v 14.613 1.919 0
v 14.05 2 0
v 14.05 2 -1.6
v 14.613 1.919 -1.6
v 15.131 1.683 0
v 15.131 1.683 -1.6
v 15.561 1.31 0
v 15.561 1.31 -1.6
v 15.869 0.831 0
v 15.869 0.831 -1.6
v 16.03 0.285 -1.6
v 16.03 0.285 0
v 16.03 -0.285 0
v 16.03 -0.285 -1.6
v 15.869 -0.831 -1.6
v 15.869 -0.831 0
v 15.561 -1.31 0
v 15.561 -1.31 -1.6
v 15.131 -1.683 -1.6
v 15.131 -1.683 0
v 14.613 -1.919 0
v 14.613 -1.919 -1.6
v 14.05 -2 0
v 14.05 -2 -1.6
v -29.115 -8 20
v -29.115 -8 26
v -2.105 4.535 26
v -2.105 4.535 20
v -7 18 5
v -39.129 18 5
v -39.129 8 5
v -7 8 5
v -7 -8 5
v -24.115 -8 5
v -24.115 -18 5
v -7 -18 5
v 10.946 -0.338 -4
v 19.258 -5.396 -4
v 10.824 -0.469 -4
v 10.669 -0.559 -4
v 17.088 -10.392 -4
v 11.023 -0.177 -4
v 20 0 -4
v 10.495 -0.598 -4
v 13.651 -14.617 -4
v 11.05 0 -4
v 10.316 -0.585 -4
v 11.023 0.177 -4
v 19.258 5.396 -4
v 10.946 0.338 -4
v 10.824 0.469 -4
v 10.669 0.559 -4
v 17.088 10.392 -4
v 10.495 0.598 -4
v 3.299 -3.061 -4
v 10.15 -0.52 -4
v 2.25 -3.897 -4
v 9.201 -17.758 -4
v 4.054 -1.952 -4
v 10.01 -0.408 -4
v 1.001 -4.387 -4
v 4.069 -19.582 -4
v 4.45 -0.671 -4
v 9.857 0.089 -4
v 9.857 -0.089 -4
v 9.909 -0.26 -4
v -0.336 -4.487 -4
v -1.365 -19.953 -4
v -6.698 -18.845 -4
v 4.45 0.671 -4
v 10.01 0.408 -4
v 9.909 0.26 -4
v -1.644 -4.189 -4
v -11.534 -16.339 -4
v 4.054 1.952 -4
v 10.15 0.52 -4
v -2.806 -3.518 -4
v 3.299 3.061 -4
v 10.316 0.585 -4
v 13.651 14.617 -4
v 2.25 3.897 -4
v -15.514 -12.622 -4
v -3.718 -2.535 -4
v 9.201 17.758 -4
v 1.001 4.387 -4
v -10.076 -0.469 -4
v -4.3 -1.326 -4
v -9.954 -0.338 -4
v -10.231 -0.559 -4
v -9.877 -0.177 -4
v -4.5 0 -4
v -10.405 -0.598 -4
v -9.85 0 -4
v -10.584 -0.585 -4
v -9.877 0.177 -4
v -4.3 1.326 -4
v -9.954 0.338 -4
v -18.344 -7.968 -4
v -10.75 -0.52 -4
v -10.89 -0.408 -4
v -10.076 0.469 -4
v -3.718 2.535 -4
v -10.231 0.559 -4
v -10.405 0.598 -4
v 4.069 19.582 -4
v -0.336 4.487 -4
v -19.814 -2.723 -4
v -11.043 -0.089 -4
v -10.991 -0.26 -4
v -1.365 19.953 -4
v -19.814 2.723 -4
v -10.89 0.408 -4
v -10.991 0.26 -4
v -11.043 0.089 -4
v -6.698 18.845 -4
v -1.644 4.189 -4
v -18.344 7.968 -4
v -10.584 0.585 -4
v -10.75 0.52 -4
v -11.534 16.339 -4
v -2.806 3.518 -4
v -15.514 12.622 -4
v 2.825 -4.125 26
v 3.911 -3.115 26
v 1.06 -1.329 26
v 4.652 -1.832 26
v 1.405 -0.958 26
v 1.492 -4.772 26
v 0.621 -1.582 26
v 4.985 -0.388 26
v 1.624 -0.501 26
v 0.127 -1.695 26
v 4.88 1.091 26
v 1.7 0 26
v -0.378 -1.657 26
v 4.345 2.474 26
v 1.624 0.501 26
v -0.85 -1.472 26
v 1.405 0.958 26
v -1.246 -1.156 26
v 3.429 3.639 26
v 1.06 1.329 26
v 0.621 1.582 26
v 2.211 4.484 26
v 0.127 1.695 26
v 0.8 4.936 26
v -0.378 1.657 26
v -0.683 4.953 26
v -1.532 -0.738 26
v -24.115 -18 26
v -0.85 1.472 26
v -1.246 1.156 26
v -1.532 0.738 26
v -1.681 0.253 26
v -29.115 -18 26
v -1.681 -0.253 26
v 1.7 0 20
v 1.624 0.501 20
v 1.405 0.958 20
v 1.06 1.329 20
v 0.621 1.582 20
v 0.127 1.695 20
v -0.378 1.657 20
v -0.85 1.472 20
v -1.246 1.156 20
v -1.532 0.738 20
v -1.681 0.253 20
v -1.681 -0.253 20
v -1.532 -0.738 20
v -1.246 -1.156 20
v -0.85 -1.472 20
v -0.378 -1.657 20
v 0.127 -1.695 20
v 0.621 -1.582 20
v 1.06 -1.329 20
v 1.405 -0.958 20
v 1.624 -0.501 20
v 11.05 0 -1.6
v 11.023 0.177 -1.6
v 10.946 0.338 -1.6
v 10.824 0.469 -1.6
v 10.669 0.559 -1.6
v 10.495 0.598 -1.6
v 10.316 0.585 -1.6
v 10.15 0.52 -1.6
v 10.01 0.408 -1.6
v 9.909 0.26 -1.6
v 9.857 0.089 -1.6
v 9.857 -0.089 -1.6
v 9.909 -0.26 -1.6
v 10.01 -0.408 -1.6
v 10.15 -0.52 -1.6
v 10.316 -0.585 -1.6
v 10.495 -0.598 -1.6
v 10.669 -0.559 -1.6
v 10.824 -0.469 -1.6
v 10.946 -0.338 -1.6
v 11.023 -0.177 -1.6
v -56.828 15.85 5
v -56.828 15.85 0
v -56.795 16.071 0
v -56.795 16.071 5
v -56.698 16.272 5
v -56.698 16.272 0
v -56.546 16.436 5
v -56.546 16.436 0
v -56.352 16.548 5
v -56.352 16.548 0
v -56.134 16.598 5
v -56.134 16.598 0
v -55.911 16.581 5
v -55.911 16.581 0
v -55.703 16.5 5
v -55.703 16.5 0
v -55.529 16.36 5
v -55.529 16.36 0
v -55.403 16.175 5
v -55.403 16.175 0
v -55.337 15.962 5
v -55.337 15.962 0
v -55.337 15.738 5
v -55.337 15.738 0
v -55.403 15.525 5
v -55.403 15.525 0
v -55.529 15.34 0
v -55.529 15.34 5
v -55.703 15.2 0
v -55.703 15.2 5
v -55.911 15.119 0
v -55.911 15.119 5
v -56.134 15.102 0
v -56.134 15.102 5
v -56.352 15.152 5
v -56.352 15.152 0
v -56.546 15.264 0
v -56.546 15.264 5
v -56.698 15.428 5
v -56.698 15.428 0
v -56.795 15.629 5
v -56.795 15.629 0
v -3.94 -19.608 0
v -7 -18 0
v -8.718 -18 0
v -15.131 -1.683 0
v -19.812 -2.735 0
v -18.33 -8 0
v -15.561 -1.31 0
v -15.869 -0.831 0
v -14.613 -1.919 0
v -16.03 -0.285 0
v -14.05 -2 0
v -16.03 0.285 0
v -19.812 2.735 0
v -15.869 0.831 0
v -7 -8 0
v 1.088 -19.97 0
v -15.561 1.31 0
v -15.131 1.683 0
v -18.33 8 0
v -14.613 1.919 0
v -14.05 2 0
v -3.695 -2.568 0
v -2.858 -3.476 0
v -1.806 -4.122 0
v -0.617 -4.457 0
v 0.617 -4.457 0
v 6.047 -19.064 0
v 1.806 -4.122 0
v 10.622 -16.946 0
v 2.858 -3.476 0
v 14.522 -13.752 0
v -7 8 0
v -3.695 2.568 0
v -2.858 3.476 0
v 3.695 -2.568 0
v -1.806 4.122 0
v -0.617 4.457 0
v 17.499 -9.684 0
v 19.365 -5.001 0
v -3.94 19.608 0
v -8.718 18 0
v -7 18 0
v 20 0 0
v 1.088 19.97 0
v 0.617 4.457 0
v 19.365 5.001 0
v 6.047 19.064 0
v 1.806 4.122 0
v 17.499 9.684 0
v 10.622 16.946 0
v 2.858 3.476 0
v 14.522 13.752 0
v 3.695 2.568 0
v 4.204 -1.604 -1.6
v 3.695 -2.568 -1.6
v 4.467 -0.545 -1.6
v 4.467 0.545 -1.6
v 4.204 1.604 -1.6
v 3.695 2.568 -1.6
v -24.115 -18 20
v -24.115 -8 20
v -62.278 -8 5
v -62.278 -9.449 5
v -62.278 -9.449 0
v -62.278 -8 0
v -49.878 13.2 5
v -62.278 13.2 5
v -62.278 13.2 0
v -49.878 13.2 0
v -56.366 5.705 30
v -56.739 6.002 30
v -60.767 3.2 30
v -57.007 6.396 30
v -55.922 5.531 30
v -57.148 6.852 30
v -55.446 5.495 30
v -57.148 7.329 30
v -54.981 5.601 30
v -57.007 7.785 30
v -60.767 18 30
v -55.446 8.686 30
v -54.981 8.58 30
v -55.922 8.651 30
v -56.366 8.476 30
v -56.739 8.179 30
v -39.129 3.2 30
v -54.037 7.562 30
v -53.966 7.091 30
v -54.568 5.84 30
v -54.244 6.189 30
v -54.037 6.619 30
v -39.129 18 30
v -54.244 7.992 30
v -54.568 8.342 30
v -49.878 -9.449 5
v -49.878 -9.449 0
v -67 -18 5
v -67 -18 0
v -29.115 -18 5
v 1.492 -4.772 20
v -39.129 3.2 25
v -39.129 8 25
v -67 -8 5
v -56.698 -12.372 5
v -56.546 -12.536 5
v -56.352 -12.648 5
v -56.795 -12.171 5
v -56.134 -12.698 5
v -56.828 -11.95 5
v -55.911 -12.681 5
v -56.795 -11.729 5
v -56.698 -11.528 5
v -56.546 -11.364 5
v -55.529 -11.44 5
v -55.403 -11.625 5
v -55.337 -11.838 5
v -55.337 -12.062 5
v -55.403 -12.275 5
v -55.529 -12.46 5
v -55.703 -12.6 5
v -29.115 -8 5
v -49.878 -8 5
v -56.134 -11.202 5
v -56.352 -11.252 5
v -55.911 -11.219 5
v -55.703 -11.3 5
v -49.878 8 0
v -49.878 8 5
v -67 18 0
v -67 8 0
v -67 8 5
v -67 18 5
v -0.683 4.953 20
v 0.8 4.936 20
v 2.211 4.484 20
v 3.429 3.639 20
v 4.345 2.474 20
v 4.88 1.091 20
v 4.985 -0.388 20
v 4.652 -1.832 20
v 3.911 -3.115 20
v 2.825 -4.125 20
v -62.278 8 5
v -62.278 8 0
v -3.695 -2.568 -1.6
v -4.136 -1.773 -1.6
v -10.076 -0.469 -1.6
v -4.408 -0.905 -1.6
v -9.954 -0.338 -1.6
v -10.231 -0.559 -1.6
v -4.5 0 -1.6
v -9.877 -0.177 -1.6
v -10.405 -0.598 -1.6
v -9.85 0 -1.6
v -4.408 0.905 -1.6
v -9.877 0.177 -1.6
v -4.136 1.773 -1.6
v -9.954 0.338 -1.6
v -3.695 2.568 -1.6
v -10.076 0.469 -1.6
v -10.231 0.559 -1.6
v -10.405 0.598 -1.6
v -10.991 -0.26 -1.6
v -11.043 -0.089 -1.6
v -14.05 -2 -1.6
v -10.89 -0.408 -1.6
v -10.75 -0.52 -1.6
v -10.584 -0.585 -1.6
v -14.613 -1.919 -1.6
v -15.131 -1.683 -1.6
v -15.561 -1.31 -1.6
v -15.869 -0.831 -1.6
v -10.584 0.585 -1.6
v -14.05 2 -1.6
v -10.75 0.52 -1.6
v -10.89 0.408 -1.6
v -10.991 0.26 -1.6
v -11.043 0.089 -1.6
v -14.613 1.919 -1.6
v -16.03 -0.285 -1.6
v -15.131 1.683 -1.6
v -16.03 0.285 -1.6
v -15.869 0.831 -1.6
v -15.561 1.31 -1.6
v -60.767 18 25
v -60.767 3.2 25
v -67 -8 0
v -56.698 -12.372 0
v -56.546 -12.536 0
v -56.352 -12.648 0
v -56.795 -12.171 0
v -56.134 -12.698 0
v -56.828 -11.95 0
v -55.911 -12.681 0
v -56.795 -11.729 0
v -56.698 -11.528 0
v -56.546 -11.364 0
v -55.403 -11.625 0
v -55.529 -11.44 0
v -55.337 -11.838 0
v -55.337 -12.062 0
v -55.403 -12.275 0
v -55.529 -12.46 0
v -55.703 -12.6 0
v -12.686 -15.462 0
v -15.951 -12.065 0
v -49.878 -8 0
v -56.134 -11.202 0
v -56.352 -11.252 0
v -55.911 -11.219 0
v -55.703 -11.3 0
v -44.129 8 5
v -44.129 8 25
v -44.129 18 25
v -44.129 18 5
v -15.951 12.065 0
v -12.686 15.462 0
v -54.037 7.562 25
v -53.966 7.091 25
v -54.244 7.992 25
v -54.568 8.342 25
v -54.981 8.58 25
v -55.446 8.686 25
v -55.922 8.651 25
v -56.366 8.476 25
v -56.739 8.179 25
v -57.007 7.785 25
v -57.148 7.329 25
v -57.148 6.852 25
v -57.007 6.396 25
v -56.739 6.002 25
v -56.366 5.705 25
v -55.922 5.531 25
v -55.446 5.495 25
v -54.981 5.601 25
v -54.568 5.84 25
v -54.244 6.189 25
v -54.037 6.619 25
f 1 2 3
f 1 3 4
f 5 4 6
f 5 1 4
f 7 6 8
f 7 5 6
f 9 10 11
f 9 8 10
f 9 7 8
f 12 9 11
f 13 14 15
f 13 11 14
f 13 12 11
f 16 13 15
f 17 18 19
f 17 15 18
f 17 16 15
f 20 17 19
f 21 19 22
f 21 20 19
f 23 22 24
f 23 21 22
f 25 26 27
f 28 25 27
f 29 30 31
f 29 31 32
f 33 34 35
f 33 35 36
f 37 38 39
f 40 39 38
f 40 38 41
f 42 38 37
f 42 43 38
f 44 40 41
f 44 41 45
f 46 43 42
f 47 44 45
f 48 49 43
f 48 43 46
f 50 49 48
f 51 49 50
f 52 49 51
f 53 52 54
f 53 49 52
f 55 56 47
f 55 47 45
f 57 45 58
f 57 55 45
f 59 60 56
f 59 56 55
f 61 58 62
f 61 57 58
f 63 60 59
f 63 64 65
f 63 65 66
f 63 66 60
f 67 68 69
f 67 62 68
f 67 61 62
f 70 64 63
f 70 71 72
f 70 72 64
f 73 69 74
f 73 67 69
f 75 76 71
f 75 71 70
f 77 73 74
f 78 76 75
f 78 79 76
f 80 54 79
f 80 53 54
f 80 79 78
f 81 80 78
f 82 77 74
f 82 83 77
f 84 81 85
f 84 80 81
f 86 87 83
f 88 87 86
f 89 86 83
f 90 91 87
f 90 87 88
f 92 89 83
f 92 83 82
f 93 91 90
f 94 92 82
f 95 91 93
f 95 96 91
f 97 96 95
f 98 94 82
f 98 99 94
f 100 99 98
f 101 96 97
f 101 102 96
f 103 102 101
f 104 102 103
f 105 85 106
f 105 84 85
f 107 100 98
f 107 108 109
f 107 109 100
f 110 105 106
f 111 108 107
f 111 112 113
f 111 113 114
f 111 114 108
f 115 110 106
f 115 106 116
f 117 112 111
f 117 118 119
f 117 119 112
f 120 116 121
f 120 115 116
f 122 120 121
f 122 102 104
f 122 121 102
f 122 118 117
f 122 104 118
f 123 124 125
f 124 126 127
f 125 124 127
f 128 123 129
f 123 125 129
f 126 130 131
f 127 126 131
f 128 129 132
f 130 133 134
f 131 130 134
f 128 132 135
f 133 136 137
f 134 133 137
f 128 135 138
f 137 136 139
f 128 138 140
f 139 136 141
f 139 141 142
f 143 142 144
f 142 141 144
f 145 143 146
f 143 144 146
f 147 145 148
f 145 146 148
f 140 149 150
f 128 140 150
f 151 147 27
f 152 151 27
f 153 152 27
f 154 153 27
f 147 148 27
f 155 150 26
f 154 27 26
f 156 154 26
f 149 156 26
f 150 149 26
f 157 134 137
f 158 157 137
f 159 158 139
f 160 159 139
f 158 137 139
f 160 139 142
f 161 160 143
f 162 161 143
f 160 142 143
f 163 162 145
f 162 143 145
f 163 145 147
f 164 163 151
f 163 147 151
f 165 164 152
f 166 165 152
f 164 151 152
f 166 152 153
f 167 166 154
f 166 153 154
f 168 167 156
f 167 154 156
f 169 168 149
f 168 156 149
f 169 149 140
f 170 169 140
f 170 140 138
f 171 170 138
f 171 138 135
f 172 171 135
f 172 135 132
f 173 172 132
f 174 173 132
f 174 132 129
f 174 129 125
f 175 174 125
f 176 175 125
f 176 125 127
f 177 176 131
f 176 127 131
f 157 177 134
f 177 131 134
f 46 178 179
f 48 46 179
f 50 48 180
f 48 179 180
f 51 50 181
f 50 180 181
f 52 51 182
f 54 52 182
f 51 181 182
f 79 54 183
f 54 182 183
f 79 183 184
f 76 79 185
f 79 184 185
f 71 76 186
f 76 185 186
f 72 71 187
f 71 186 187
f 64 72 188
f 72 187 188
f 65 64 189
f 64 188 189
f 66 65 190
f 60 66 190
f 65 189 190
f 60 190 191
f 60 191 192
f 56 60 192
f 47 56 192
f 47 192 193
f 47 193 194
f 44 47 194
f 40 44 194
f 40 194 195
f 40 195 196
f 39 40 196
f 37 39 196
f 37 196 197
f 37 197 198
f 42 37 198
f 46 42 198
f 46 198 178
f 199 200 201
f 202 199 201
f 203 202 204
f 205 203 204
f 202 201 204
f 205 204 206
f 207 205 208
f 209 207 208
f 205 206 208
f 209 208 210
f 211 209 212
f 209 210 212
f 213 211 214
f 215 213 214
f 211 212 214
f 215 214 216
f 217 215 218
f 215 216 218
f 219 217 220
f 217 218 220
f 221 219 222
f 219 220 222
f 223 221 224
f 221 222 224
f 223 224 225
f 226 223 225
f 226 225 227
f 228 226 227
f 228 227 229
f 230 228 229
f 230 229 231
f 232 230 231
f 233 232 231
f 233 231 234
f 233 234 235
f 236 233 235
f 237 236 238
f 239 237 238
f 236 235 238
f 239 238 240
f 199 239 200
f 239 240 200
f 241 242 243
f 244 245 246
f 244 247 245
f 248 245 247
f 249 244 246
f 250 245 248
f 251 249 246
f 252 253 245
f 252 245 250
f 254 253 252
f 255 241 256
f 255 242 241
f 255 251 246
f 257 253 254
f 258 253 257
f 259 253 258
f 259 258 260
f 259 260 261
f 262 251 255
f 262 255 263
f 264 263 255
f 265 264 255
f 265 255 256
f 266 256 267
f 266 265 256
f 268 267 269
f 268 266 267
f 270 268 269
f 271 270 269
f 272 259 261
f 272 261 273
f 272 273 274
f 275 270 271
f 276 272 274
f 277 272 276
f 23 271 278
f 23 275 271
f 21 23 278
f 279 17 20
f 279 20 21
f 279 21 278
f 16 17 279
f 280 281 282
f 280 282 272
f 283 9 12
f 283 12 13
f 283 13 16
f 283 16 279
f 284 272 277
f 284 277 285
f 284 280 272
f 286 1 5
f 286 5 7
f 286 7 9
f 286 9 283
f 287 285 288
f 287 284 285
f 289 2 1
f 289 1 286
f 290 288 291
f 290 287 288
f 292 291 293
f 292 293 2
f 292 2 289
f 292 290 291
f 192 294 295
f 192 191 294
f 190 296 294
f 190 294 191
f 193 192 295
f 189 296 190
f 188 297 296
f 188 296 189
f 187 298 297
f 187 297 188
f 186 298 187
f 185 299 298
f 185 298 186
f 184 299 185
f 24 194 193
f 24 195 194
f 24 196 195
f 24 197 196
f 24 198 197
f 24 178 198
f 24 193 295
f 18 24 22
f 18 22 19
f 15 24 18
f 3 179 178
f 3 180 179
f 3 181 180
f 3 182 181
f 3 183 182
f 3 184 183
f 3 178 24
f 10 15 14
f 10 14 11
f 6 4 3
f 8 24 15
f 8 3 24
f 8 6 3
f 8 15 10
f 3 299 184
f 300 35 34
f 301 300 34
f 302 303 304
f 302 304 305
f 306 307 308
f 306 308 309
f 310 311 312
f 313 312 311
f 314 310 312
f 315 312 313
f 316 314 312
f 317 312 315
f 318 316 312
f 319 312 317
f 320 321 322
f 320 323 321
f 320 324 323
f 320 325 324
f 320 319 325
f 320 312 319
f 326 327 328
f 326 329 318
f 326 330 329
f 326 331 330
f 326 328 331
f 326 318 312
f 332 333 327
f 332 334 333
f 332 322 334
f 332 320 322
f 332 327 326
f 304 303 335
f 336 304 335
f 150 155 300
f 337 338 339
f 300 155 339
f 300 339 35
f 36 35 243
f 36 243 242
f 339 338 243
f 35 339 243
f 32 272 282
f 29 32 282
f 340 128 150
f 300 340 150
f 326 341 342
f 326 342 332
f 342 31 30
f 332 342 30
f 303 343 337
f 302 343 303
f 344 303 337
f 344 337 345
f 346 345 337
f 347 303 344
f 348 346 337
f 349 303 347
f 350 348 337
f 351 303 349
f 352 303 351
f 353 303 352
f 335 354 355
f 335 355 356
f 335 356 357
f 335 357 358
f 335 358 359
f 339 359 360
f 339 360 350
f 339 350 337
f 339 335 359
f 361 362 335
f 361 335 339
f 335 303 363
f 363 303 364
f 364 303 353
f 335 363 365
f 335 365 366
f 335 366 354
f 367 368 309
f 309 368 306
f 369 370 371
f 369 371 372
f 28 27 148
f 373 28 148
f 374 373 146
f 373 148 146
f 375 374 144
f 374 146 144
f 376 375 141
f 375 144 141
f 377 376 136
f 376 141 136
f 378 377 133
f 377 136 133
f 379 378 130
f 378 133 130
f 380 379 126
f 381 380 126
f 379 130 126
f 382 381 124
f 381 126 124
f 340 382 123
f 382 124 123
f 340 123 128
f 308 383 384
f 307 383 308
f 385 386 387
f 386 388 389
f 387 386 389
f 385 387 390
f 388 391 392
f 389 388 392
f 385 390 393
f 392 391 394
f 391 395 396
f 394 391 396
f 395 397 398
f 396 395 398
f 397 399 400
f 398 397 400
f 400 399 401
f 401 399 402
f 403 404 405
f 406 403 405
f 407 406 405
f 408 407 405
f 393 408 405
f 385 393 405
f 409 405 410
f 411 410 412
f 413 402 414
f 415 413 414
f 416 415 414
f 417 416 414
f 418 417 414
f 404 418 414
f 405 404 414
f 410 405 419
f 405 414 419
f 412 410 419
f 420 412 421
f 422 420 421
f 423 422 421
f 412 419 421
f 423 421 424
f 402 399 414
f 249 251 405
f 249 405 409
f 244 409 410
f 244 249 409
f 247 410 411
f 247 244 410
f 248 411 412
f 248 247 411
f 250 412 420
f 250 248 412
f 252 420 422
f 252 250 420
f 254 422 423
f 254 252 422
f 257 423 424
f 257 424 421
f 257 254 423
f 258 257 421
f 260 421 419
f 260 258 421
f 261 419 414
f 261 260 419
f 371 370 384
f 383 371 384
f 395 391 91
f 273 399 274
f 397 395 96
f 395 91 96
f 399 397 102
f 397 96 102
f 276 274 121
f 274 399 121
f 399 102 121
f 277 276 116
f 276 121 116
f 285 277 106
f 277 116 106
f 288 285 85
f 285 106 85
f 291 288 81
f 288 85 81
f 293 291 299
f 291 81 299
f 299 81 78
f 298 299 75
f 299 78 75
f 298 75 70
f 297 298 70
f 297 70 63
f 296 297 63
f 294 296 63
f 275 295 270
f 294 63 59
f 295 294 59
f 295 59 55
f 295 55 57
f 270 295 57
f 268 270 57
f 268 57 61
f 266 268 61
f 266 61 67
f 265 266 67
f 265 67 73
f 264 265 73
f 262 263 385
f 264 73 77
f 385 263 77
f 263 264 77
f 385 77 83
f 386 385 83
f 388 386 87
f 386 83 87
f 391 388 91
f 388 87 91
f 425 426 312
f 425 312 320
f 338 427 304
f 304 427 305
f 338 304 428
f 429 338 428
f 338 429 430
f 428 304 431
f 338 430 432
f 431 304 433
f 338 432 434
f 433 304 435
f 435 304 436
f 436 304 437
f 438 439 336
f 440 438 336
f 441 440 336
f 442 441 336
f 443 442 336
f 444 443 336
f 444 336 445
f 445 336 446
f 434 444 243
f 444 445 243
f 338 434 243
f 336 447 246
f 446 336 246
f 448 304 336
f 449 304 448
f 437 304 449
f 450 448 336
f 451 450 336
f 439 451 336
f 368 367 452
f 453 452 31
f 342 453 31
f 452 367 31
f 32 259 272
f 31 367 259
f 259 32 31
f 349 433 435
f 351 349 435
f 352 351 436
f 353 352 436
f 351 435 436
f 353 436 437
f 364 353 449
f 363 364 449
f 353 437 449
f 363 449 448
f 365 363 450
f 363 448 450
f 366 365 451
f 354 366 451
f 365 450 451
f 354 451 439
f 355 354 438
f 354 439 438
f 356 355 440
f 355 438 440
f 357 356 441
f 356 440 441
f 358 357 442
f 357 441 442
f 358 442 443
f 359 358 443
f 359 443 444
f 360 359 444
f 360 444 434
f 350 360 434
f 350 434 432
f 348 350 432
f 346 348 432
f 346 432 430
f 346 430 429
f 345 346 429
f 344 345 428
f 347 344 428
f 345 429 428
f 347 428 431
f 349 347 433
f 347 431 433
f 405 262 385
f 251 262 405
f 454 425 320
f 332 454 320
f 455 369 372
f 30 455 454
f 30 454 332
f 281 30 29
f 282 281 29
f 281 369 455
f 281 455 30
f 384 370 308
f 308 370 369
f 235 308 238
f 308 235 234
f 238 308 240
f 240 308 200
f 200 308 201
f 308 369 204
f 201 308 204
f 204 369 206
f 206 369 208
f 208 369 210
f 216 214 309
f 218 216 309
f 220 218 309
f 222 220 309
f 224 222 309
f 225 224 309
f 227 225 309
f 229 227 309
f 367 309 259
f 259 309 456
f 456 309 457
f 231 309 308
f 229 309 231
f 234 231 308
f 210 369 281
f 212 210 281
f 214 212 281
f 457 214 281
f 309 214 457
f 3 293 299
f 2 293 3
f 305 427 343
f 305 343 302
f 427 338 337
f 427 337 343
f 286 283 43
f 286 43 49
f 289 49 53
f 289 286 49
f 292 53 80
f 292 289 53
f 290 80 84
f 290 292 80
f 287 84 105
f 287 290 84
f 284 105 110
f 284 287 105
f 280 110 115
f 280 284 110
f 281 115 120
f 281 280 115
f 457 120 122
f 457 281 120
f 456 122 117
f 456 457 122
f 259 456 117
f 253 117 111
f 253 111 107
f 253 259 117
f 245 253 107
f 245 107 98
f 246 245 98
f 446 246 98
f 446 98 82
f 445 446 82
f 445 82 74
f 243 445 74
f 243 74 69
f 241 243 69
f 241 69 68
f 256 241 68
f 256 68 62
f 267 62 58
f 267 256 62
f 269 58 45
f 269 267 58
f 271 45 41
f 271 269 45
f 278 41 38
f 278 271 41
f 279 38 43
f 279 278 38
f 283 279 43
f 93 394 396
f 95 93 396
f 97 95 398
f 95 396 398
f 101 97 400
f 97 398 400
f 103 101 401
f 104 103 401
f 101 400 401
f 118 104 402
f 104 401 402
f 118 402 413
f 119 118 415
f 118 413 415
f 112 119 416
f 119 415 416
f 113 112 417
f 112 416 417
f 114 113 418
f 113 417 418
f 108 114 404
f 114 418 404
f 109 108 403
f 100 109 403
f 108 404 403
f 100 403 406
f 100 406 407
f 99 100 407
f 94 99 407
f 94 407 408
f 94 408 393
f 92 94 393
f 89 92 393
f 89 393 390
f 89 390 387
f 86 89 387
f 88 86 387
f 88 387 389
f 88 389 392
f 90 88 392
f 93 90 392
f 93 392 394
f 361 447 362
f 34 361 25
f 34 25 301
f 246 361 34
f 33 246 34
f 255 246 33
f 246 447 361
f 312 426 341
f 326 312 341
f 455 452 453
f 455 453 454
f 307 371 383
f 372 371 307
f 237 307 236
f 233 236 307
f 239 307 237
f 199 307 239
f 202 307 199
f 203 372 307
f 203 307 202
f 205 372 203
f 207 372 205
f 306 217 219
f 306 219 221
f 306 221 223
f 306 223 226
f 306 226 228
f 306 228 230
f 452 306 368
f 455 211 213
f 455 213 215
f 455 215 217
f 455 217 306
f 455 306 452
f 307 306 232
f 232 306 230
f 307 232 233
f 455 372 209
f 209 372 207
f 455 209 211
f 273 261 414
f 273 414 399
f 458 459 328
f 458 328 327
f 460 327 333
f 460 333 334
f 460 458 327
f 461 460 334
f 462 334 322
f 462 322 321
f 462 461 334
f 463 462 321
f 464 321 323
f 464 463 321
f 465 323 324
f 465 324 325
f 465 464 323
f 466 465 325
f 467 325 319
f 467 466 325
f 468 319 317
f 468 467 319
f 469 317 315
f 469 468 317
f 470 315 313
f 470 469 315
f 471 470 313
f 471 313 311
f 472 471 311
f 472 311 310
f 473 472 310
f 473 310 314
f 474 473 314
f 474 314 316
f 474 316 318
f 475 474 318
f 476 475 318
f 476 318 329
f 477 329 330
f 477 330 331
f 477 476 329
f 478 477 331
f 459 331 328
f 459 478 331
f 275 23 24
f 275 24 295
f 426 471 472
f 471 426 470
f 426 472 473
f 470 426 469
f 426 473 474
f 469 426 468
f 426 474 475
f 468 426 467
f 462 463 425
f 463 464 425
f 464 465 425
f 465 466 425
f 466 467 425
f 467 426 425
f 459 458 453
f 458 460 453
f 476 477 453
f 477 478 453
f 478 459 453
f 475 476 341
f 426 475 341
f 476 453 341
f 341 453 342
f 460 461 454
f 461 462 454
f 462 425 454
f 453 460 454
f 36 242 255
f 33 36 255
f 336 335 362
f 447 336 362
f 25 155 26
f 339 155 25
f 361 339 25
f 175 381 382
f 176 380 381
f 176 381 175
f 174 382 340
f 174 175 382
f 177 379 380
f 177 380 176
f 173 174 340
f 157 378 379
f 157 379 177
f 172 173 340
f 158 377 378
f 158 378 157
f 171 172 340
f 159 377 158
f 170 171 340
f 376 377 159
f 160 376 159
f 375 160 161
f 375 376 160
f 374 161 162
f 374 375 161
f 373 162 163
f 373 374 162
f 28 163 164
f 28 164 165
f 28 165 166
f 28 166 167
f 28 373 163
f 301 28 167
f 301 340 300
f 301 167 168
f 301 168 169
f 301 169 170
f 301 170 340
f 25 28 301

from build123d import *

# Parameters (mm, degrees)
SKETCH1_R            = 20
BOSS_EXTRUDE1_DEPTH  = 4
BOSS_EXTRUDE2_START  = -2.4
BOSS_EXTRUDE2_DEPTH  = 2.4
SKETCH6_W            = 60
SKETCH6_H            = 10
BOSS_EXTRUDE5_DEPTH  = 5
SKETCH7_R            = 0.75
CUT_EXTRUDE1_DEPTH   = 5
SKETCH8_W            = 5
SKETCH8_H            = 10
BOSS_EXTRUDE6_DEPTH  = 20
SKETCH9_W            = 21.637597824
SKETCH9_H            = 14.8
SKETCH9_R            = 1.6
BOSS_EXTRUDE7_DEPTH  = 5
SKETCH10_W           = 12.4
SKETCH10_H           = 22.64948999
CUT_EXTRUDE2_DEPTH   = 75.256312863
SKETCH11_R           = 0.6
CUT_EXTRUDE3_DEPTH   = 10
SKETCH12_R           = 4.5
CUT_EXTRUDE4_DEPTH   = 5
SKETCH14_W           = 5
SKETCH14_H           = 10
BOSS_EXTRUDE9_DEPTH  = 21
SKETCH15_R           = 1.7
BOSS_EXTRUDE10_DEPTH = 6


with BuildPart() as part:
    # Sketch1 → Boss-Extrude1 (new body)
    with BuildSketch(Plane.XY):
        Circle(SKETCH1_R)
        with BuildLine():
            Line((-14.05, 2), (-2.209072203, 2.65))
            ThreePointArc((-2.209072203, 2.65), (0, 3.45), (2.209072203, 2.65))
            Line((2.209072203, 2.65), (14.05, 2))
            ThreePointArc((14.05, 2), (16.05, 0), (14.05, -2))
            Line((14.05, -2), (2.209072203, -2.65))
            ThreePointArc((2.209072203, -2.65), (0, -3.45), (-2.209072203, -2.65))
            Line((-2.209072203, -2.65), (-14.05, -2))
            ThreePointArc((-14.05, -2), (-16.05, 0), (-14.05, 2))
        make_face(mode=Mode.SUBTRACT)
    extrude(amount=-BOSS_EXTRUDE1_DEPTH)

    # Sketch2 → Boss-Extrude2 (add)
    with BuildSketch(Plane(origin=(0, 0, -4), x_dir=(-1, 0, 0), z_dir=(0, 0, -1)).offset(BOSS_EXTRUDE2_START)):
        with BuildLine():
            Line((14.05, 2), (2.209072203, 2.65))
            ThreePointArc((2.209072203, 2.65), (3.45, 0), (2.209072203, -2.65))
            Line((2.209072203, -2.65), (14.05, -2))
            ThreePointArc((14.05, -2), (16.05, 0), (14.05, 2))
        make_face()
        with BuildLine():
            Line((-2.209072203, -2.65), (-14.05, -2))
            ThreePointArc((-14.05, -2), (-16.05, 0), (-14.05, 2))
            Line((-14.05, 2), (-2.209072203, 2.65))
            ThreePointArc((-2.209072203, 2.65), (-3.45, 0), (-2.209072203, -2.65))
        make_face()
    extrude(amount=BOSS_EXTRUDE2_DEPTH)

    # Sketch6 → Boss-Extrude5 (add)
    with BuildSketch(Plane.XY):
        with Locations((-37, 13)):
            Rectangle(SKETCH6_W, SKETCH6_H)
        with Locations((-37, -13)):
            Rectangle(SKETCH6_W, SKETCH6_H)
    extrude(amount=BOSS_EXTRUDE5_DEPTH)

    # Sketch7 → Cut-Extrude1 (cut)
    with BuildSketch(Plane(origin=(0, 0, 0), x_dir=(-1, 0, 0), z_dir=(0, 0, -1))):
        with Locations((56.078339908, 15.85)):
            Circle(SKETCH7_R)
        with Locations((56.078339908, -11.95)):
            Circle(SKETCH7_R)
    extrude(amount=-CUT_EXTRUDE1_DEPTH, mode=Mode.SUBTRACT)

    # Sketch8 → Boss-Extrude6 (add)
    with BuildSketch(Plane.XY.offset(5)):
        with Locations((-41.629269641, 13)):
            Rectangle(SKETCH8_W, SKETCH8_H)
    extrude(amount=BOSS_EXTRUDE6_DEPTH)

    # Sketch9 → Boss-Extrude7 (add)
    with BuildSketch(Plane.XY.offset(25)):
        with Locations((-49.948068553, 10.6)):
            Rectangle(SKETCH9_W, SKETCH9_H)
        with Locations((-55.565935261, 7.090653296)):
            Circle(SKETCH9_R, mode=Mode.SUBTRACT)
    extrude(amount=BOSS_EXTRUDE7_DEPTH)

    # Sketch10 → Cut-Extrude2 (cut, through all)
    with BuildSketch(Plane.XY.offset(5)):
        with Locations((-56.078339908, 1.875255005)):
            Rectangle(SKETCH10_W, SKETCH10_H)
    extrude(amount=-CUT_EXTRUDE2_DEPTH, mode=Mode.SUBTRACT)

    # Sketch11 → Cut-Extrude3 (cut)
    with BuildSketch(Plane.XY):
        with Locations((-10.45, 0)):
            Circle(SKETCH11_R)
        with Locations((10.45, 0)):
            Circle(SKETCH11_R)
    extrude(amount=-CUT_EXTRUDE3_DEPTH, mode=Mode.SUBTRACT)

    # Sketch12 → Cut-Extrude4 (cut)
    with BuildSketch(Plane(origin=(0, 0, -4), x_dir=(-1, 0, 0), z_dir=(0, 0, -1))):
        Circle(SKETCH12_R)
    extrude(amount=-CUT_EXTRUDE4_DEPTH, mode=Mode.SUBTRACT)

    # Sketch14 → Boss-Extrude9 (add)
    with BuildSketch(Plane.XY.offset(5)):
        with Locations((-26.615087819, -13)):
            Rectangle(SKETCH14_W, SKETCH14_H)
    extrude(amount=BOSS_EXTRUDE9_DEPTH)

    # Sketch15 → Boss-Extrude10 (add)
    with BuildSketch(Plane.XY.offset(26)):
        with BuildLine():
            Line((-29.115087819, -8), (-2.104852737, 4.535371535))
            ThreePointArc((-2.104852737, 4.535371535), (4.663893683, 1.802247406), (1.491850027, -4.772251408))
            Line((1.491850027, -4.772251408), (-24.115087819, -18))
            Line((-24.115087819, -18), (-29.115087819, -18))
            Line((-29.115087819, -18), (-29.115087819, -8))
        make_face()
        Circle(SKETCH15_R, mode=Mode.SUBTRACT)
    extrude(amount=-BOSS_EXTRUDE10_DEPTH)


solid = part.part
